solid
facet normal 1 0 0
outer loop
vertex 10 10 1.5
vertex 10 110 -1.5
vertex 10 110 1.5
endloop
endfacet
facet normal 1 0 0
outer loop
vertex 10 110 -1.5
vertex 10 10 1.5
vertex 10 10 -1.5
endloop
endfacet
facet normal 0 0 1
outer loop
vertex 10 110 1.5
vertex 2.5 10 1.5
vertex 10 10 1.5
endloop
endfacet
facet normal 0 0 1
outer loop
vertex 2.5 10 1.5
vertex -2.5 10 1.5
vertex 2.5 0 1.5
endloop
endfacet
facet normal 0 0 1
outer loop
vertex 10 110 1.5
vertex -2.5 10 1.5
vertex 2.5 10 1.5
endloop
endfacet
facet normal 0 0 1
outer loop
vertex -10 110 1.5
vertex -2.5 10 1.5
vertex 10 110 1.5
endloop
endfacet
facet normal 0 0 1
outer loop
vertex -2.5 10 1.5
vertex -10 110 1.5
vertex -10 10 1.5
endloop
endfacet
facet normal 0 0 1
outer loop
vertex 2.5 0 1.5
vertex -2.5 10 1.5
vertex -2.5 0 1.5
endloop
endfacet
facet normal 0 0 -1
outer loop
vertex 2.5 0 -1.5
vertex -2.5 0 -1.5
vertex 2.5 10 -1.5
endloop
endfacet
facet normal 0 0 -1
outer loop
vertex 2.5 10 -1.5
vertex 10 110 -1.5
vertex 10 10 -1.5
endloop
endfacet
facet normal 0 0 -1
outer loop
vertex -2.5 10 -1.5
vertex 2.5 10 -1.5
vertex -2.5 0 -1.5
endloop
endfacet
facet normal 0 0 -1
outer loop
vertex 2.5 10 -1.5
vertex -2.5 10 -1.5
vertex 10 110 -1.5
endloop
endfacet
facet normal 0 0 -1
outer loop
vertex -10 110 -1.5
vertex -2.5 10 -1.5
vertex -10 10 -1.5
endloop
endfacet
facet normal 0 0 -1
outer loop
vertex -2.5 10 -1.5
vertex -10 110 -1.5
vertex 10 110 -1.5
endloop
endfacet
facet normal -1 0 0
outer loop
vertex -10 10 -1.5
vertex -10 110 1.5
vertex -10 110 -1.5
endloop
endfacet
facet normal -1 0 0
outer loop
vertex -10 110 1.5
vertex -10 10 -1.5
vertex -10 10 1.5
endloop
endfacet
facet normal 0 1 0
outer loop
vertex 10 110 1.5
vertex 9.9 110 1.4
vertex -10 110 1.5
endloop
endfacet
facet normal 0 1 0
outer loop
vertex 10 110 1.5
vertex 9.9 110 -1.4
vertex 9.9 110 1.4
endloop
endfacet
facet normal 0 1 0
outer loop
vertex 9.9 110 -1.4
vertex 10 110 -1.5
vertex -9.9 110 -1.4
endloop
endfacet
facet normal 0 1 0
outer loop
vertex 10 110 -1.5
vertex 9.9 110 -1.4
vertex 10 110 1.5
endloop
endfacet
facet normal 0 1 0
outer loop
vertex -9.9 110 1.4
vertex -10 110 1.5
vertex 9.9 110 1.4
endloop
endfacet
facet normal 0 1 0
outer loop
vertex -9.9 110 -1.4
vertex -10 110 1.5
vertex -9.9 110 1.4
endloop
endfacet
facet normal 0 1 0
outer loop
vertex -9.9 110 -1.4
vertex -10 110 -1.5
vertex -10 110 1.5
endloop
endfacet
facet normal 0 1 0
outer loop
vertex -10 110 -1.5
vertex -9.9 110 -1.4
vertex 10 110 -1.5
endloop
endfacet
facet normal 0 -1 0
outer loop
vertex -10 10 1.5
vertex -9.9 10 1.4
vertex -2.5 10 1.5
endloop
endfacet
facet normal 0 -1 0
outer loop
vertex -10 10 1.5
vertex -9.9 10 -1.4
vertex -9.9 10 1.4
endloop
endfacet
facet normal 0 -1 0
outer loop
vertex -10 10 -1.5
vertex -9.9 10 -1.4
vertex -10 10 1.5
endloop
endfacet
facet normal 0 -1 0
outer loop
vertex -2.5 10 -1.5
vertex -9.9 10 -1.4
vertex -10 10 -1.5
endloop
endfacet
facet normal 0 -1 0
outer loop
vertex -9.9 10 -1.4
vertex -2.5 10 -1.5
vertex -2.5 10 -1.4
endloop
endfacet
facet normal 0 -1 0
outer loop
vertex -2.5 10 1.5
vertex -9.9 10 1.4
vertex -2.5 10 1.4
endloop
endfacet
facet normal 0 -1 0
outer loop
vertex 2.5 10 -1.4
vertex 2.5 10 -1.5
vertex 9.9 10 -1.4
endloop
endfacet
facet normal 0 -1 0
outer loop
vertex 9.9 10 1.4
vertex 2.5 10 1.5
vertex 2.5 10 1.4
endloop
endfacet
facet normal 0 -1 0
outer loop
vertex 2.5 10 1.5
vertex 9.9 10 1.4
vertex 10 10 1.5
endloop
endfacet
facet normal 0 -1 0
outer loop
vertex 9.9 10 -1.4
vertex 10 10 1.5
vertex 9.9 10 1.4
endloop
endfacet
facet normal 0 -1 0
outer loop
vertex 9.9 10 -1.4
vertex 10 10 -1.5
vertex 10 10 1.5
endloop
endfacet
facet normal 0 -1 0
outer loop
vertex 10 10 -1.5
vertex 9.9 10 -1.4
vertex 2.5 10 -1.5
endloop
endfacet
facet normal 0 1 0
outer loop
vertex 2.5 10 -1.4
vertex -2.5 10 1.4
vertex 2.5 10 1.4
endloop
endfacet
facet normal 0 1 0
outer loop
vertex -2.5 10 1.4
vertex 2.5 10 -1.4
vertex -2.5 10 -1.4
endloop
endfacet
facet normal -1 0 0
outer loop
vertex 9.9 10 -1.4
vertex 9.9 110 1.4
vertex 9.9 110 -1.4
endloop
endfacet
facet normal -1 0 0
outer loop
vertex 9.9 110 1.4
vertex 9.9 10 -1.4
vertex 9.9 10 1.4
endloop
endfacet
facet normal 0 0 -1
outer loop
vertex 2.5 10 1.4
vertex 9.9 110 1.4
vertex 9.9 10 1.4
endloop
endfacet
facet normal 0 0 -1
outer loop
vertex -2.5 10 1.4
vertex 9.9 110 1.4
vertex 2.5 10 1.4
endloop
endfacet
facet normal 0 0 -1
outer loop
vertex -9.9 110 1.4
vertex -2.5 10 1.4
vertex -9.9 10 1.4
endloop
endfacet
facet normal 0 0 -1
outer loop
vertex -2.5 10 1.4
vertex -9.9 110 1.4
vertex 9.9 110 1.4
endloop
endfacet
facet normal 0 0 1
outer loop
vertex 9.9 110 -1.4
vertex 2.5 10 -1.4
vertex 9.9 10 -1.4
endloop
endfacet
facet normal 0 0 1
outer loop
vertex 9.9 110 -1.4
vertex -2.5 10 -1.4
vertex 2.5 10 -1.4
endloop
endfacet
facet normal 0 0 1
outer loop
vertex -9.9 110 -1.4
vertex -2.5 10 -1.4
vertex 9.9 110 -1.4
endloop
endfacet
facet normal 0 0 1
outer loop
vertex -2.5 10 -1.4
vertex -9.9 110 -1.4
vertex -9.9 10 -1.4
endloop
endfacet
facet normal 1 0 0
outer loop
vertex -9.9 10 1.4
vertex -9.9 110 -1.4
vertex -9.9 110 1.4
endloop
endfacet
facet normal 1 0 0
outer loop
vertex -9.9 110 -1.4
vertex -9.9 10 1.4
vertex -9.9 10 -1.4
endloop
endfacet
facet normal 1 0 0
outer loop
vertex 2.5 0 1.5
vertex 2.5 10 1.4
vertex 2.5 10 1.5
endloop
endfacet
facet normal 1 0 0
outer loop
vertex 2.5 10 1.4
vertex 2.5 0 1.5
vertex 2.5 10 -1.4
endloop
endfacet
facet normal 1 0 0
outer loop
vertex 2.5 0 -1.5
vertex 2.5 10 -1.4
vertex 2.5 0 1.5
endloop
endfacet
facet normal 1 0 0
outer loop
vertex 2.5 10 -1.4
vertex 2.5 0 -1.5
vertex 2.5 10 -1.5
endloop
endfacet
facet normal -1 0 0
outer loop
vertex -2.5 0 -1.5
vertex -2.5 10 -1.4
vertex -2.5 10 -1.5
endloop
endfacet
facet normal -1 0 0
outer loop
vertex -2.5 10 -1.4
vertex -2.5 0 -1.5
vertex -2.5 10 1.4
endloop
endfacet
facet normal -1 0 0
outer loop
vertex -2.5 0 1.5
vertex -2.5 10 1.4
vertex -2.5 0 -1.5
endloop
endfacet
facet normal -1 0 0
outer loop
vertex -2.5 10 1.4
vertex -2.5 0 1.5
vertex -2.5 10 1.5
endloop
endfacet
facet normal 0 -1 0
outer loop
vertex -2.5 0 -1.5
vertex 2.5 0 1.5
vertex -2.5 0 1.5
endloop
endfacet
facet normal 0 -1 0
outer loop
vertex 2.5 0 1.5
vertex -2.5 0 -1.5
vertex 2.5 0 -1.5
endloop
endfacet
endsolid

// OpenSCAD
module straight_segment(length, width, thickness, wallThickness=0) {

  if (wallThickness > 0) {
    difference () {
      straight_segment(length, width, thickness);
      straight_segment(length, width-(2*wallThickness), thickness-(2*wallThickness));
    }
  } else {
    translate([0,length/2, 0])
      cube([width, length, thickness], center=true);
  }
}

module add_straight_segment(length, width, thickness, wallThickness=0) {
  straight_segment(length, width, thickness, wallThickness);
  translate([0,length, 0])
    for(i = [0 : $children - 1])
      children(i);
}

// Testing
echo("##########");
echo("In straight_segment.scad");
echo("This file should not be included, use ''use <filemane>'' instead.");
echo("##########");

p = 1;
if (p==1) {
  add_straight_segment(10,5,3)
    straight_segment(100,20,3,0.1);
}
